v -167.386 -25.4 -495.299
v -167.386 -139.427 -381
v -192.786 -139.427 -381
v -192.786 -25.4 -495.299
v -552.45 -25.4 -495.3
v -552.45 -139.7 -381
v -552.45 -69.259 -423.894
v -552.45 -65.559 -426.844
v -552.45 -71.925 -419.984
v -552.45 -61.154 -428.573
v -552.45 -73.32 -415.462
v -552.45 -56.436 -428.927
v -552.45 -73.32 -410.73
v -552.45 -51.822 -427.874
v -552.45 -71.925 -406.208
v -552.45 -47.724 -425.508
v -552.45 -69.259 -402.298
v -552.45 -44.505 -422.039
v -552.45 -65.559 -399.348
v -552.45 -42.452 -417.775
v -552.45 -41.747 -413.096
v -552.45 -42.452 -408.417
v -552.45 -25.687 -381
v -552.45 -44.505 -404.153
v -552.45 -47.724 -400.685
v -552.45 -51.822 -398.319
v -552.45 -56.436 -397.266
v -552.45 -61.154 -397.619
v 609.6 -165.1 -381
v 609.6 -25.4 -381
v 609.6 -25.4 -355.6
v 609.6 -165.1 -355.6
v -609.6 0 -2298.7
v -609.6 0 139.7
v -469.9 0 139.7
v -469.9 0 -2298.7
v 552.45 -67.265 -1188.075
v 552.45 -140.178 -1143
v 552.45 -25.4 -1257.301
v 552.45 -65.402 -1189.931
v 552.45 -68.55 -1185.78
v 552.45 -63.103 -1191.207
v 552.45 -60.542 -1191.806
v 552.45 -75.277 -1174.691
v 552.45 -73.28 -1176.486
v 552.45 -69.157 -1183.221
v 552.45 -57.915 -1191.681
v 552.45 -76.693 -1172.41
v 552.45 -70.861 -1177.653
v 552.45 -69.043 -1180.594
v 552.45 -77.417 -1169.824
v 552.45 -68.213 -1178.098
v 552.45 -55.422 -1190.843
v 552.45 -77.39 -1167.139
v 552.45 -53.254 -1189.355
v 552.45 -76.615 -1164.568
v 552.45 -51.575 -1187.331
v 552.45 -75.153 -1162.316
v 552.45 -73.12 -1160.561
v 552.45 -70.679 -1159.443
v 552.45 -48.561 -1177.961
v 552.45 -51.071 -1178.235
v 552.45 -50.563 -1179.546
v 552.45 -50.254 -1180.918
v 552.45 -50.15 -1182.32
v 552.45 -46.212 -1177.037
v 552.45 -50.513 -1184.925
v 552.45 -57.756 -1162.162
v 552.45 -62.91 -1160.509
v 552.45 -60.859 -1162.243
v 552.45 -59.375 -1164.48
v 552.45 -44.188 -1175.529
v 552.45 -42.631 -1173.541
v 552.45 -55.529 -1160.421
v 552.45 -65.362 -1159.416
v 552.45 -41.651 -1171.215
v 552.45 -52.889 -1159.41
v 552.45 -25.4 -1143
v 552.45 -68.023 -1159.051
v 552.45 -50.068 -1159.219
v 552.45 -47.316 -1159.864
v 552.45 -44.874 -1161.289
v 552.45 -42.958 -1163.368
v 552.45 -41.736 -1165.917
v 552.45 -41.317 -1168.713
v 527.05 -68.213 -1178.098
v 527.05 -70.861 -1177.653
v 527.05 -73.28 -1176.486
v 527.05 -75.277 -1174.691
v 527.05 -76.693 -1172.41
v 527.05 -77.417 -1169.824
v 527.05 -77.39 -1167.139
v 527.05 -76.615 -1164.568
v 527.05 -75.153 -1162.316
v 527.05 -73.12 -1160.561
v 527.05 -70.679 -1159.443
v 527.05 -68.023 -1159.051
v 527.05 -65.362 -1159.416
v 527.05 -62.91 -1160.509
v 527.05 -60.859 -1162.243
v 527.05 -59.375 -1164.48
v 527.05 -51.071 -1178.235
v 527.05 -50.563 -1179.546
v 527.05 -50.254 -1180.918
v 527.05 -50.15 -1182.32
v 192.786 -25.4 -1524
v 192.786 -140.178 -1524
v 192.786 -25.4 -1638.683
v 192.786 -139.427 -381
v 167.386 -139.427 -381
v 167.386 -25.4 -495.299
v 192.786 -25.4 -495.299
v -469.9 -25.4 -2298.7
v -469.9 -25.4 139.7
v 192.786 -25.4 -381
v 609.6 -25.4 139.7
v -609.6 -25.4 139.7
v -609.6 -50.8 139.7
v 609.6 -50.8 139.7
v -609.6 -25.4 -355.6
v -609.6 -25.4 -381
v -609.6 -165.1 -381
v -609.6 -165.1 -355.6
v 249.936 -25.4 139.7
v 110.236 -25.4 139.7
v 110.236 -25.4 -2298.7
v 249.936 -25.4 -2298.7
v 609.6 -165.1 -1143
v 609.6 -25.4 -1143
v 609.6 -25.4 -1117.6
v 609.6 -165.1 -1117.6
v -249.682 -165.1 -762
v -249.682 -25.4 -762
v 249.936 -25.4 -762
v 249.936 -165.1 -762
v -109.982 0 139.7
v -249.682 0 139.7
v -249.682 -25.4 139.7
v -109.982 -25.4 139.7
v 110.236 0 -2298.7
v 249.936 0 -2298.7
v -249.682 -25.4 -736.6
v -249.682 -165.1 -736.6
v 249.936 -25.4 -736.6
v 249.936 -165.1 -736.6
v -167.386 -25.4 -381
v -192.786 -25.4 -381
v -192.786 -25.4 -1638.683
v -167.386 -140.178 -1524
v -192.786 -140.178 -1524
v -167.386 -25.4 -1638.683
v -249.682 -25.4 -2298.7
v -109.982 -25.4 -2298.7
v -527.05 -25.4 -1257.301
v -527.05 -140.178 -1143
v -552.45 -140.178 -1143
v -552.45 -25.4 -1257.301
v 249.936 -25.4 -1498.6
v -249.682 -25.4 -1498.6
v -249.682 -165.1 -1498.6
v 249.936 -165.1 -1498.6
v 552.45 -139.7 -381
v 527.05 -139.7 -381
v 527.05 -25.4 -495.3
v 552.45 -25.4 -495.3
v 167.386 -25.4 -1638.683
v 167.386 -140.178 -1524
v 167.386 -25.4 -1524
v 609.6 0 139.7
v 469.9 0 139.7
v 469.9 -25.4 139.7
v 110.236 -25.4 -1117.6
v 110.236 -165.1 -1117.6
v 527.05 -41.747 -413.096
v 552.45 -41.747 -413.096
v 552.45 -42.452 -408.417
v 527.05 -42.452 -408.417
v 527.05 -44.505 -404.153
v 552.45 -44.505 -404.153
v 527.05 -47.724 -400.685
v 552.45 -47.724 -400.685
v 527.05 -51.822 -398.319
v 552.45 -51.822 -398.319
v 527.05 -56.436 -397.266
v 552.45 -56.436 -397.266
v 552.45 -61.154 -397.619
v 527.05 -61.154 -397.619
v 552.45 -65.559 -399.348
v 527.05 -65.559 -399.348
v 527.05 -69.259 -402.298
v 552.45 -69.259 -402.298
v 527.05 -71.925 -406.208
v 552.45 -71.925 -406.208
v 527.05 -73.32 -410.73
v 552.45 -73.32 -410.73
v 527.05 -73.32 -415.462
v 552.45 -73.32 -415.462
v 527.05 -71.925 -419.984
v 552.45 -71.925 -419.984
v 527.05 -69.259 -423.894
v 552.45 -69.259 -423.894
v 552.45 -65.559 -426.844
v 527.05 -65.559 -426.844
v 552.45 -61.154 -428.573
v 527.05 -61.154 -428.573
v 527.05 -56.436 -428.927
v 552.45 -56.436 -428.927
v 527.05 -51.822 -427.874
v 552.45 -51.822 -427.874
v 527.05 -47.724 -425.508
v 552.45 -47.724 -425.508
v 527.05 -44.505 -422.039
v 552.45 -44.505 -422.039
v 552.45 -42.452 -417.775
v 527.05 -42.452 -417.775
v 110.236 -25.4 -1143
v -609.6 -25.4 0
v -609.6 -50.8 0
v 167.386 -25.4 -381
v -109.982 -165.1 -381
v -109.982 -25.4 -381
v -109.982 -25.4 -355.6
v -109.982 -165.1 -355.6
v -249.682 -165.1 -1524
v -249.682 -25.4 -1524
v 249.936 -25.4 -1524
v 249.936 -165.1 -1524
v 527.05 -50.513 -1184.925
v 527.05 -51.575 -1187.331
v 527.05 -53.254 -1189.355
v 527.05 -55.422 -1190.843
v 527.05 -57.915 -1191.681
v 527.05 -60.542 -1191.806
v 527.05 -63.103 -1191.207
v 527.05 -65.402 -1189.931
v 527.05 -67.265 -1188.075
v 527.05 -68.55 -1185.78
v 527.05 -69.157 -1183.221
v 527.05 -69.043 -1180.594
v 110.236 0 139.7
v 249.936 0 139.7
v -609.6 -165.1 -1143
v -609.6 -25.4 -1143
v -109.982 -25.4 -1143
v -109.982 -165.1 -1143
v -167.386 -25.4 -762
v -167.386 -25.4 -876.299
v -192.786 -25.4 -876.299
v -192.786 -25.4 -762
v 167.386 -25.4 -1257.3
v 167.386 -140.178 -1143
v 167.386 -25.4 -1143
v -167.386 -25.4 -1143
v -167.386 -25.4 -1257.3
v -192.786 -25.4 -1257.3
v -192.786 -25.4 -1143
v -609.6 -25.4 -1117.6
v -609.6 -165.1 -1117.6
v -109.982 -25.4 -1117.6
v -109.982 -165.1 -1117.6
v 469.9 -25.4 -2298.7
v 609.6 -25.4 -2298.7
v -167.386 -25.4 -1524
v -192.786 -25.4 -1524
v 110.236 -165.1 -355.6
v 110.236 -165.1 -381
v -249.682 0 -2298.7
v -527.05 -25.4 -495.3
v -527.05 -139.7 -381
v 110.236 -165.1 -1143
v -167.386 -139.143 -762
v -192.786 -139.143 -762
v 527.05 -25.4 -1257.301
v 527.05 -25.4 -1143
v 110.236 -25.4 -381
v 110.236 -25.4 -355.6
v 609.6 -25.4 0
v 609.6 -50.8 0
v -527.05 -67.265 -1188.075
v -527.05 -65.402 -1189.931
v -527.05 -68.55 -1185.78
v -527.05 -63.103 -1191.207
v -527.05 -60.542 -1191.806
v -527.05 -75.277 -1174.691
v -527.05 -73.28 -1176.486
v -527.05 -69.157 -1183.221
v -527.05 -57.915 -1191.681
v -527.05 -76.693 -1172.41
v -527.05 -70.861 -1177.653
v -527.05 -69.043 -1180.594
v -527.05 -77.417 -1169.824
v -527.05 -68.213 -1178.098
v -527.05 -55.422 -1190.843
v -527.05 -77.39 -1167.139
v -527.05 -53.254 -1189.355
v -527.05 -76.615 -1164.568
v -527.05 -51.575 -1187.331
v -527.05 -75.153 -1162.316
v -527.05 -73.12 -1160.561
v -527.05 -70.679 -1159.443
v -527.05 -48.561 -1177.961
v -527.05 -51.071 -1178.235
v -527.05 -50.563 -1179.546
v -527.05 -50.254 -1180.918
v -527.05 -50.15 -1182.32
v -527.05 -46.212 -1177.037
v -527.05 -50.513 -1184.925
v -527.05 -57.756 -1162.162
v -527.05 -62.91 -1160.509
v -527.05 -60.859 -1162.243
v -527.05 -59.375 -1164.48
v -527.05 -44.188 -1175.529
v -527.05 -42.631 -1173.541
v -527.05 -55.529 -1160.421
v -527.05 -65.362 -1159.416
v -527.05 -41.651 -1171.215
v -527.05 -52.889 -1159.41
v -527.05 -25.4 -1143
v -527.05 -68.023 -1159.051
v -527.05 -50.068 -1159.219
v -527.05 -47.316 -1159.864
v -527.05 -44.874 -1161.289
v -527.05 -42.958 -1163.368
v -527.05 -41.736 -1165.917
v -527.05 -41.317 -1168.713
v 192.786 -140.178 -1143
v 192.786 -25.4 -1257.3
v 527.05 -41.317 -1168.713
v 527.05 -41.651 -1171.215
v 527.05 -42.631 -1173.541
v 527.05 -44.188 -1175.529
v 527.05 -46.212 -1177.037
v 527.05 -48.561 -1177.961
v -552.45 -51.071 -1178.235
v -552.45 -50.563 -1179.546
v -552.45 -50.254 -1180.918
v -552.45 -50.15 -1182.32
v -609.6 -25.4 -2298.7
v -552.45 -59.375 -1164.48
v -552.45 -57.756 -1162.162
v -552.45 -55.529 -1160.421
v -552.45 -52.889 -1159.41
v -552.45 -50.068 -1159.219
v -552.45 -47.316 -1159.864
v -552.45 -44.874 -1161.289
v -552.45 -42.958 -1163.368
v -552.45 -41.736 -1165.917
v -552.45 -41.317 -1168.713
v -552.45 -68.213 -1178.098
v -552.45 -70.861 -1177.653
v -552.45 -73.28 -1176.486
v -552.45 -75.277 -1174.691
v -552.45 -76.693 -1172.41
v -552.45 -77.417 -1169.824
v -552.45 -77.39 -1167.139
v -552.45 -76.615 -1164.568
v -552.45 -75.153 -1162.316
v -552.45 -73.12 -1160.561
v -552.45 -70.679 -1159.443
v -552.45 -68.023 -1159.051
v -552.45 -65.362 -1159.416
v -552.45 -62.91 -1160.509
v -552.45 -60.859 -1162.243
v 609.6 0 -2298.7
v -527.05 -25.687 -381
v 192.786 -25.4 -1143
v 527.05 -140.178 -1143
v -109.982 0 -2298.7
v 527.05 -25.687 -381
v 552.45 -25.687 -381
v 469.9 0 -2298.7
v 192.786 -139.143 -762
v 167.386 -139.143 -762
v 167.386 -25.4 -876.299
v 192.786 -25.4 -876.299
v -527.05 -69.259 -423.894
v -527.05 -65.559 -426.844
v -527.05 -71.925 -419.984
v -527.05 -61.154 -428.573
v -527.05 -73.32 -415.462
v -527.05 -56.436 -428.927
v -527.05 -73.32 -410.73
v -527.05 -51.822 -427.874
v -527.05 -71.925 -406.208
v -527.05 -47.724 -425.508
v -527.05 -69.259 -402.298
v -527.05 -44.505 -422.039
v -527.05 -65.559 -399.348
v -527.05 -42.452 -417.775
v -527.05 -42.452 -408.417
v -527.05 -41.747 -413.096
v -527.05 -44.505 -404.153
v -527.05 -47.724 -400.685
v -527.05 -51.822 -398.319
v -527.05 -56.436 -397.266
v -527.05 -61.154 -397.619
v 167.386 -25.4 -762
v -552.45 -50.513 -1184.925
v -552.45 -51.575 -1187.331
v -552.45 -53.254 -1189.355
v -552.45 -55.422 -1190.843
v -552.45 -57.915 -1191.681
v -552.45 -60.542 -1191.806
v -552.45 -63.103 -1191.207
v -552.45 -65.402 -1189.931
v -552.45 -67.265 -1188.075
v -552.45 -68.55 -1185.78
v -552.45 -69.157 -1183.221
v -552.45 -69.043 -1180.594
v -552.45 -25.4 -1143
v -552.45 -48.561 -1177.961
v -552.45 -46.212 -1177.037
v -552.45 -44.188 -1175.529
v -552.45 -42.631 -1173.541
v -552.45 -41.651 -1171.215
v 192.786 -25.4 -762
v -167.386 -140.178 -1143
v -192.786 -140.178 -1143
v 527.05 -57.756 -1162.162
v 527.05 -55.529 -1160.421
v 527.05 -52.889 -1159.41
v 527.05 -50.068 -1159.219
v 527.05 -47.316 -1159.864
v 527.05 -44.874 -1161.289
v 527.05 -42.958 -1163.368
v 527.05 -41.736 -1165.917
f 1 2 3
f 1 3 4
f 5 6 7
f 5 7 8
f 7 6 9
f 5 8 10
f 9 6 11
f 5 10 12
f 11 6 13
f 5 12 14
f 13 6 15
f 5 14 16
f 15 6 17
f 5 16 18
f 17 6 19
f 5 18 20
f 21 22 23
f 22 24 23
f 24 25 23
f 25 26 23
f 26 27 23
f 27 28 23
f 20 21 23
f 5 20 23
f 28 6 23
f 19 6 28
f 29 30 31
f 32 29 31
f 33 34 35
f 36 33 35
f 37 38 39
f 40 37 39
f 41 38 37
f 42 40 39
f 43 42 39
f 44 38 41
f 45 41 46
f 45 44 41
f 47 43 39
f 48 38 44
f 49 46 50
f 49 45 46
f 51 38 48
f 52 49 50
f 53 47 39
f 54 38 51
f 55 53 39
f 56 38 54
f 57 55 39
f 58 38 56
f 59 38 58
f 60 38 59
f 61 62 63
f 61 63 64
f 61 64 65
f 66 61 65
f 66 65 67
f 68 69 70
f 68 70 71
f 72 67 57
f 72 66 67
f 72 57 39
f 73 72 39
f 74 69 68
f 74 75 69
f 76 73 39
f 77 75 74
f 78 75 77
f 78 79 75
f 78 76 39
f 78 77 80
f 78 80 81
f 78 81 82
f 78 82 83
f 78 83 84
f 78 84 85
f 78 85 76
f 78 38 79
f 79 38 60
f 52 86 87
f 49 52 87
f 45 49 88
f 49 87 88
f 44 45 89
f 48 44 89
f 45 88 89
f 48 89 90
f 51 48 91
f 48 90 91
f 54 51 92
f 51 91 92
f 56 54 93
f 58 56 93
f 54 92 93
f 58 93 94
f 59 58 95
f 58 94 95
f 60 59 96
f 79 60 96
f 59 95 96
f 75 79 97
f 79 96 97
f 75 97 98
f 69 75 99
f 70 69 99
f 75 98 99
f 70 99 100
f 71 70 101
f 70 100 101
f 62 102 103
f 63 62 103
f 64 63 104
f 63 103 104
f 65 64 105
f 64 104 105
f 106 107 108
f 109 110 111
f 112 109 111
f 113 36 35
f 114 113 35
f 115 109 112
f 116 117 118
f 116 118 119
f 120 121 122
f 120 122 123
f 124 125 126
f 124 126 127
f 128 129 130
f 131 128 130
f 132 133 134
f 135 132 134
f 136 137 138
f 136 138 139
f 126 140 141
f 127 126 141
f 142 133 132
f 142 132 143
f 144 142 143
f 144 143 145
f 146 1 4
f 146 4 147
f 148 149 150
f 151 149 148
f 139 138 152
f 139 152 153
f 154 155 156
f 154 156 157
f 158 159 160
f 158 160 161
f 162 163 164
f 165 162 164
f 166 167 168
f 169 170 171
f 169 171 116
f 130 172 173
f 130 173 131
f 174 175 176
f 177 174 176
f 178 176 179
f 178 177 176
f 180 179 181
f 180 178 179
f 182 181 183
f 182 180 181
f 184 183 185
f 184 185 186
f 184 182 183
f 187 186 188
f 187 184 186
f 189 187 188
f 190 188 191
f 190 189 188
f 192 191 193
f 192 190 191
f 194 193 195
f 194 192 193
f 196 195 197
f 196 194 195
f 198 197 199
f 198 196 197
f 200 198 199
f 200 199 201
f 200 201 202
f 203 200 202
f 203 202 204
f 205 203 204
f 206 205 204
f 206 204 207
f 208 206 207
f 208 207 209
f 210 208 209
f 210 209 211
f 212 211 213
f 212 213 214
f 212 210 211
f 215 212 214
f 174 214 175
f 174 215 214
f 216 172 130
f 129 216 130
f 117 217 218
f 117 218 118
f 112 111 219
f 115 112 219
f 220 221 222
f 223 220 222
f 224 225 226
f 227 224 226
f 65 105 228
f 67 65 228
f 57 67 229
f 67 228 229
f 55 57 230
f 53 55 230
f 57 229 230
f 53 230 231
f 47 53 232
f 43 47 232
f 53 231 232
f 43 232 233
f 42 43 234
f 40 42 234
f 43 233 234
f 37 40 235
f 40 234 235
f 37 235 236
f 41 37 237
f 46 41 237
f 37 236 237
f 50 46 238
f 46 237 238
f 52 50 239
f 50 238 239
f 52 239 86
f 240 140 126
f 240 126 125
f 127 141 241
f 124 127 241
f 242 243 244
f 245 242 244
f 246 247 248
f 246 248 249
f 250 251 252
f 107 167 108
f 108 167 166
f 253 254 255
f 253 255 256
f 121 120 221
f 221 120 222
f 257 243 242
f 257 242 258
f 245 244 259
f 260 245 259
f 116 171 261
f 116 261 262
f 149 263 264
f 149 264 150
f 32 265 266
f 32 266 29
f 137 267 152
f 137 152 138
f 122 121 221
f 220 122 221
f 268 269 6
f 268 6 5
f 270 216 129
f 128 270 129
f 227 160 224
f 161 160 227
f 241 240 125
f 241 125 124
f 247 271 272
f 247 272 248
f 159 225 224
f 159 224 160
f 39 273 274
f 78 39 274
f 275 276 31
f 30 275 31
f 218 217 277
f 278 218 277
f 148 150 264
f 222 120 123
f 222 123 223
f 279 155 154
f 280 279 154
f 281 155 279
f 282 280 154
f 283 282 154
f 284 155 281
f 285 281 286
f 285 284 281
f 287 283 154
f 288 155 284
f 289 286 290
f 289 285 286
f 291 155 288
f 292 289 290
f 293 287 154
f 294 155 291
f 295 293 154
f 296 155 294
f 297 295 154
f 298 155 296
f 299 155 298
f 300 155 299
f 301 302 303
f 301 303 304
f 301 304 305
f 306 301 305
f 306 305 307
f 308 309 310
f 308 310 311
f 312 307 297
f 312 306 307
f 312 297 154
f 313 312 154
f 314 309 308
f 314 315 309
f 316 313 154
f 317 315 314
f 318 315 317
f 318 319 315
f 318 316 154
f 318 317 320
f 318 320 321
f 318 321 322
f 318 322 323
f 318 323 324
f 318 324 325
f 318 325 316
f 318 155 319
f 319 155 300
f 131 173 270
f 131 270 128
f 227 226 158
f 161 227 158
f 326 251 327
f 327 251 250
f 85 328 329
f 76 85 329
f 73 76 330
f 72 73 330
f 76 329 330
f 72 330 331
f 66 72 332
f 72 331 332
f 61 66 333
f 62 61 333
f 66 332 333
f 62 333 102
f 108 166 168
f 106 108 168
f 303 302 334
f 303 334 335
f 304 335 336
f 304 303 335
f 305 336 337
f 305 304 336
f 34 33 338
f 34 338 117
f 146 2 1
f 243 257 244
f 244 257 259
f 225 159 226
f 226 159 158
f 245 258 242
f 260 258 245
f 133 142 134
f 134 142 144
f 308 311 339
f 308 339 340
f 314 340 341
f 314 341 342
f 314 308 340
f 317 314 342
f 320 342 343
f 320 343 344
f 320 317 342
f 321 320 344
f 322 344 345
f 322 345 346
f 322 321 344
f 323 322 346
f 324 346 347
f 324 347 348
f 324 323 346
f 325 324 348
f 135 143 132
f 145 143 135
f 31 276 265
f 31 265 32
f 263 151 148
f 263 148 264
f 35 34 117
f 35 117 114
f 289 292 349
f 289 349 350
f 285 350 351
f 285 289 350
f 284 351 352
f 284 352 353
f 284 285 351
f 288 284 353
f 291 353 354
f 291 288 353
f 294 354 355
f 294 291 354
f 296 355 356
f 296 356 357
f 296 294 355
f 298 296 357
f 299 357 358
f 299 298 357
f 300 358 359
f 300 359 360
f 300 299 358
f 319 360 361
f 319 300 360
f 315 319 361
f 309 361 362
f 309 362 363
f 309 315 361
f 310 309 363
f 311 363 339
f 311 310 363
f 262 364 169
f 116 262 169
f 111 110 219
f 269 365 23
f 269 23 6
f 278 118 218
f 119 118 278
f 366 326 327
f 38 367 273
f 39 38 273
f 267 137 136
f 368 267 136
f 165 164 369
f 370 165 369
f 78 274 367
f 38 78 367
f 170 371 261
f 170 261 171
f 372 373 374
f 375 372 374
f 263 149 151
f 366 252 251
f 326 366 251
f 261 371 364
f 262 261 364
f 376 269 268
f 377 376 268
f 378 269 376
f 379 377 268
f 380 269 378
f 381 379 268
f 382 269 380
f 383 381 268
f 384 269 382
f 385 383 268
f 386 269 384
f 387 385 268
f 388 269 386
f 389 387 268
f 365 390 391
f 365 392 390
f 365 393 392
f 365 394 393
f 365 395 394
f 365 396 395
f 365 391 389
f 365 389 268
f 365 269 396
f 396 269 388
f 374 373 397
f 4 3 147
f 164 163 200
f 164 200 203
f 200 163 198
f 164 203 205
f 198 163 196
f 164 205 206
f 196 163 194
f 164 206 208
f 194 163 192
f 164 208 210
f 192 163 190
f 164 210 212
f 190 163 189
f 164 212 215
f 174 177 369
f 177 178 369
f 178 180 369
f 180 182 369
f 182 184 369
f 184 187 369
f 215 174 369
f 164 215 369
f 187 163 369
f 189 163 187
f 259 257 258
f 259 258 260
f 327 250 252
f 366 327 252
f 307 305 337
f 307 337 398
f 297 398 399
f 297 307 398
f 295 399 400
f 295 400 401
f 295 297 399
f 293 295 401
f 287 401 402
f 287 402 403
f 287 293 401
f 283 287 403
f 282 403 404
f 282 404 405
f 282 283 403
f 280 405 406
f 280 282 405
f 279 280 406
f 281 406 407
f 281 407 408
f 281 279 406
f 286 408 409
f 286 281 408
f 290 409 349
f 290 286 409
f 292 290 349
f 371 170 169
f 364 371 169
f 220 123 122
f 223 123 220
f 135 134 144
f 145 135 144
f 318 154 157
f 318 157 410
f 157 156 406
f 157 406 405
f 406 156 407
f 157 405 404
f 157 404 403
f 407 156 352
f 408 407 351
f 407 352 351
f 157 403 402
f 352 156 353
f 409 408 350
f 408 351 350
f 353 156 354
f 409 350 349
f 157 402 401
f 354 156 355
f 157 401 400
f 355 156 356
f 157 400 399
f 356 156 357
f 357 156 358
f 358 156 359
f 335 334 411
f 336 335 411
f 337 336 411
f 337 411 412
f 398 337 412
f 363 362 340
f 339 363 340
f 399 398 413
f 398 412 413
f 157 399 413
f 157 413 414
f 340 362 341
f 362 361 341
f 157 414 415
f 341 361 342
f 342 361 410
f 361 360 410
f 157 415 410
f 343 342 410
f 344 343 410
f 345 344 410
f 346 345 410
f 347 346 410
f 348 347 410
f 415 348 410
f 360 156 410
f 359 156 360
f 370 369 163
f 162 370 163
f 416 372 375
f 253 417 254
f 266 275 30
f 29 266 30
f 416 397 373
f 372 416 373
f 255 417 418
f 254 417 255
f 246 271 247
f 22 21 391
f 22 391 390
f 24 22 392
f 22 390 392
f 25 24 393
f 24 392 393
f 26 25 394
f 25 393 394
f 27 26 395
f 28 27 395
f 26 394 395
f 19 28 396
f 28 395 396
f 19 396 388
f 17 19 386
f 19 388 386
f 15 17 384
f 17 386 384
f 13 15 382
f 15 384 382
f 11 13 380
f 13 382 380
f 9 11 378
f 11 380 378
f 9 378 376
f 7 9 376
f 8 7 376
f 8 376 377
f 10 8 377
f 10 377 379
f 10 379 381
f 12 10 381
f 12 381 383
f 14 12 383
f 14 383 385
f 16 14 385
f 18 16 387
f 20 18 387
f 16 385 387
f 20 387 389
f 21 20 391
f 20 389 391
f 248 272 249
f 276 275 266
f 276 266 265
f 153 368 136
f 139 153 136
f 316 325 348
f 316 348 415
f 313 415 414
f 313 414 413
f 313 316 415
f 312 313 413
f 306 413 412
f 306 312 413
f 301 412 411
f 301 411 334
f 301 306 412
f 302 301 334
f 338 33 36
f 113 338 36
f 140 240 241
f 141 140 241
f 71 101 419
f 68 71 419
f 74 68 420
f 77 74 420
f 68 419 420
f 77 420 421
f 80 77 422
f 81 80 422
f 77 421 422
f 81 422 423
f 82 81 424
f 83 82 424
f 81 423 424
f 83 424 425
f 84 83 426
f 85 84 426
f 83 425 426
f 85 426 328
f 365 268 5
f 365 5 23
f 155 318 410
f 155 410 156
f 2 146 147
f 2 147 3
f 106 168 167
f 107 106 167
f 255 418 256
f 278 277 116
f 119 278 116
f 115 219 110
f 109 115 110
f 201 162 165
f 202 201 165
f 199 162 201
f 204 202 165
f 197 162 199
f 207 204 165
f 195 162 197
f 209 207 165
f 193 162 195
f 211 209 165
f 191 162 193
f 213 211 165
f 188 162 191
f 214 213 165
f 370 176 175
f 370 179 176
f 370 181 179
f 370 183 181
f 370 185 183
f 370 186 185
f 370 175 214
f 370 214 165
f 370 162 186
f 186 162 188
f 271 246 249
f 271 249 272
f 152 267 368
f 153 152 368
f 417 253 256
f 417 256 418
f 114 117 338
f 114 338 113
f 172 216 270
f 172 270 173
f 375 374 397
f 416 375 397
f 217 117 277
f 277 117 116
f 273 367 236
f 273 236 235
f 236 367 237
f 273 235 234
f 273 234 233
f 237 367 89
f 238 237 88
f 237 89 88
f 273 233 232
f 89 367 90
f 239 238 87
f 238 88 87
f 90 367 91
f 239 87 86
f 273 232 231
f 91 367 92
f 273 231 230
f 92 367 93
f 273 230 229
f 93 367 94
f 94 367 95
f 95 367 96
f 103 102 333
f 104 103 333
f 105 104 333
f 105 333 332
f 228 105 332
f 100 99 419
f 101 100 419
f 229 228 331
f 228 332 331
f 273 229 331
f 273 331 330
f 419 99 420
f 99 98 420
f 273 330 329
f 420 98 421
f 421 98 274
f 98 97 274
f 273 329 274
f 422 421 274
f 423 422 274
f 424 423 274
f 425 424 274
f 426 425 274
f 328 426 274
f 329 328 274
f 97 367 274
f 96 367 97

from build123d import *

# Parameters (mm, degrees)
F2_W      = 139.7
F2_H      = 2438.4
F3_DEPTH  = 25.4
F1_W      = 1219.2
F1_H      = 139.7
F4_DEPTH  = 25.4
F5_W      = 499.618
F5_H      = 25.4
F6_DEPTH  = 139.7
F5_W_2    = 499.364
F8_R      = 15.875
F9_DEPTH  = 25.4
F12_DEPTH = 25.4


with BuildPart() as f3:
    # F2 (on Front) → F3 (new body)
    with BuildSketch(Plane.XZ):
        with Locations((-539.75, -1079.5)):
            Rectangle(F2_W, F2_H)
    extrude(amount=F3_DEPTH)


with BuildPart() as f3b:
    # F2 (on Front) → F3, piece 2 (new body)
    with BuildSketch(Plane.XZ):
        with Locations((180.086, -1079.5)):
            Rectangle(F2_W, F2_H)
    extrude(amount=F3_DEPTH)


with BuildPart() as f3c:
    # F2 (on Front) → F3, piece 3 (new body)
    with BuildSketch(Plane.XZ):
        with Locations((539.75, -1079.5)):
            Rectangle(F2_W, F2_H)
    extrude(amount=F3_DEPTH)


with BuildPart() as f3d:
    # F2 (on Front) → F3, piece 4 (new body)
    with BuildSketch(Plane.XZ):
        with Locations((-179.832, -1079.5)):
            Rectangle(F2_W, F2_H)
    extrude(amount=F3_DEPTH)


with BuildPart() as f4:
    # F1 (on offset) → F4 (new body)
    with BuildSketch(Plane.XZ.offset(25.4)):
        with Locations((0, 69.85)):
            Rectangle(F1_W, F1_H)
    extrude(amount=F4_DEPTH)


with BuildPart() as f6:
    # F5 (on face) → F6 (new body)
    with BuildSketch(Plane.XZ.offset(25.4)):
        with Locations((-359.791, -368.3)):
            Rectangle(F5_W, F5_H)
    extrude(amount=F6_DEPTH)


with BuildPart() as f6b:
    # F5 (on face) → F6, piece 2 (new body)
    with BuildSketch(Plane.XZ.offset(25.4)):
        with Locations((0.127, -749.3)):
            Rectangle(F5_W, F5_H)
    extrude(amount=F6_DEPTH)


with BuildPart() as f6c:
    # F5 (on face) → F6, piece 3 (new body)
    with BuildSketch(Plane.XZ.offset(25.4)):
        with Locations((359.918, -368.3)):
            Rectangle(F5_W_2, F5_H)
    extrude(amount=F6_DEPTH)


with BuildPart() as f6d:
    # F5 (on face) → F6, piece 4 (new body)
    with BuildSketch(Plane.XZ.offset(25.4)):
        with Locations((-359.791, -1130.3)):
            Rectangle(F5_W, F5_H)
    extrude(amount=F6_DEPTH)


with BuildPart() as f6e:
    # F5 (on face) → F6, piece 5 (new body)
    with BuildSketch(Plane.XZ.offset(25.4)):
        with Locations((0.127, -1511.3)):
            Rectangle(F5_W, F5_H)
    extrude(amount=F6_DEPTH)


with BuildPart() as f6f:
    # F5 (on face) → F6, piece 6 (new body)
    with BuildSketch(Plane.XZ.offset(25.4)):
        with Locations((359.918, -1130.3)):
            Rectangle(F5_W_2, F5_H)
    extrude(amount=F6_DEPTH)


with BuildPart() as f9:
    # F8 (on offset) → F9 (new body)
    with BuildSketch(Plane.YZ.offset(527.05)):
        Polygon((-139.7, -381), (-25.4, -495.3), (-25.6870295873, -381), align=None)
        with Locations((-57.6219541111, -413.0961237742)):
            Circle(F8_R, mode=Mode.SUBTRACT)
    extrude(amount=F9_DEPTH)


with BuildPart() as f9b:
    # F8 (on offset) → F9, piece 2 (new body)
    with BuildSketch(Plane.YZ.offset(527.05)):
        Polygon((-140.1776322007, -1143), (-25.4, -1257.3012319016), (-25.4, -1143), align=None)
        with BuildLine():
            ThreePointArc((-68.2134990621, -1178.0982422456), (-75.9634175951, -1163.3905258093), (-59.374539165, -1164.4801461424))
            ThreePointArc((-59.374539165, -1164.4801461424), (-48.6679574891, -1159.4392138085), (-41.3166771753, -1168.7128629137))
            ThreePointArc((-41.3166771753, -1168.7128629137), (-44.1879166442, -1175.5285137112), (-51.0706080508, -1178.2351113695))
            ThreePointArc((-51.0706080508, -1178.2351113695), (-50.3831609032, -1180.2263567741), (-50.1502138249, -1182.3200084884))
            ThreePointArc((-50.1502138249, -1182.3200084884), (-61.842984352, -1191.5950500485), (-68.2134990621, -1178.0982422456))
        make_face(mode=Mode.SUBTRACT)
    extrude(amount=F9_DEPTH)


with BuildPart() as f12:
    # F11 (on offset) → F12 (new body)
    with BuildSketch(Plane.YZ.offset(167.386)):
        Polygon((-139.4271376938, -381), (-25.4, -495.2991886284), (-25.4, -381), align=None)
    extrude(amount=F12_DEPTH)


with BuildPart() as f12b:
    # F11 (on offset) → F12, piece 2 (new body)
    with BuildSketch(Plane.YZ.offset(167.386)):
        Polygon((-140.1776322007, -1143), (-25.4, -1257.3002576828), (-25.4, -1143), align=None)
    extrude(amount=F12_DEPTH)


with BuildPart() as f12c:
    # F11 (on offset) → F12, piece 3 (new body)
    with BuildSketch(Plane.YZ.offset(167.386)):
        Polygon((-139.1433354586, -762), (-25.4, -876.299364799), (-25.4, -762), align=None)
    extrude(amount=F12_DEPTH)


with BuildPart() as f12d:
    # F11 (on offset) → F12, piece 4 (new body)
    with BuildSketch(Plane.YZ.offset(167.386)):
        Polygon((-140.1776322007, -1524), (-25.4, -1638.6834383011), (-25.4, -1524), align=None)
    extrude(amount=F12_DEPTH)


with BuildPart() as f13_1:
    # F13: instance of F12
    add(f12.part.mirror(Plane.YZ))


with BuildPart() as f13_2:
    # F13: instance of F9
    add(f9.part.mirror(Plane.YZ))


with BuildPart() as f13_3:
    # F13: instance of F12c
    add(f12c.part.mirror(Plane.YZ))


with BuildPart() as f13_4:
    # F13: instance of F12b
    add(f12b.part.mirror(Plane.YZ))


with BuildPart() as f13_5:
    # F13: instance of F9b
    add(f9b.part.mirror(Plane.YZ))


with BuildPart() as f13_6:
    # F13: instance of F12d
    add(f12d.part.mirror(Plane.YZ))


solid = Compound([f3.part, f3b.part, f3c.part, f3d.part, f4.part, f6.part, f6b.part, f6c.part, f6d.part, f6e.part, f6f.part, f9.part, f9b.part, f12.part, f12b.part, f12c.part, f12d.part, f13_1.part, f13_2.part, f13_3.part, f13_4.part, f13_5.part, f13_6.part])
